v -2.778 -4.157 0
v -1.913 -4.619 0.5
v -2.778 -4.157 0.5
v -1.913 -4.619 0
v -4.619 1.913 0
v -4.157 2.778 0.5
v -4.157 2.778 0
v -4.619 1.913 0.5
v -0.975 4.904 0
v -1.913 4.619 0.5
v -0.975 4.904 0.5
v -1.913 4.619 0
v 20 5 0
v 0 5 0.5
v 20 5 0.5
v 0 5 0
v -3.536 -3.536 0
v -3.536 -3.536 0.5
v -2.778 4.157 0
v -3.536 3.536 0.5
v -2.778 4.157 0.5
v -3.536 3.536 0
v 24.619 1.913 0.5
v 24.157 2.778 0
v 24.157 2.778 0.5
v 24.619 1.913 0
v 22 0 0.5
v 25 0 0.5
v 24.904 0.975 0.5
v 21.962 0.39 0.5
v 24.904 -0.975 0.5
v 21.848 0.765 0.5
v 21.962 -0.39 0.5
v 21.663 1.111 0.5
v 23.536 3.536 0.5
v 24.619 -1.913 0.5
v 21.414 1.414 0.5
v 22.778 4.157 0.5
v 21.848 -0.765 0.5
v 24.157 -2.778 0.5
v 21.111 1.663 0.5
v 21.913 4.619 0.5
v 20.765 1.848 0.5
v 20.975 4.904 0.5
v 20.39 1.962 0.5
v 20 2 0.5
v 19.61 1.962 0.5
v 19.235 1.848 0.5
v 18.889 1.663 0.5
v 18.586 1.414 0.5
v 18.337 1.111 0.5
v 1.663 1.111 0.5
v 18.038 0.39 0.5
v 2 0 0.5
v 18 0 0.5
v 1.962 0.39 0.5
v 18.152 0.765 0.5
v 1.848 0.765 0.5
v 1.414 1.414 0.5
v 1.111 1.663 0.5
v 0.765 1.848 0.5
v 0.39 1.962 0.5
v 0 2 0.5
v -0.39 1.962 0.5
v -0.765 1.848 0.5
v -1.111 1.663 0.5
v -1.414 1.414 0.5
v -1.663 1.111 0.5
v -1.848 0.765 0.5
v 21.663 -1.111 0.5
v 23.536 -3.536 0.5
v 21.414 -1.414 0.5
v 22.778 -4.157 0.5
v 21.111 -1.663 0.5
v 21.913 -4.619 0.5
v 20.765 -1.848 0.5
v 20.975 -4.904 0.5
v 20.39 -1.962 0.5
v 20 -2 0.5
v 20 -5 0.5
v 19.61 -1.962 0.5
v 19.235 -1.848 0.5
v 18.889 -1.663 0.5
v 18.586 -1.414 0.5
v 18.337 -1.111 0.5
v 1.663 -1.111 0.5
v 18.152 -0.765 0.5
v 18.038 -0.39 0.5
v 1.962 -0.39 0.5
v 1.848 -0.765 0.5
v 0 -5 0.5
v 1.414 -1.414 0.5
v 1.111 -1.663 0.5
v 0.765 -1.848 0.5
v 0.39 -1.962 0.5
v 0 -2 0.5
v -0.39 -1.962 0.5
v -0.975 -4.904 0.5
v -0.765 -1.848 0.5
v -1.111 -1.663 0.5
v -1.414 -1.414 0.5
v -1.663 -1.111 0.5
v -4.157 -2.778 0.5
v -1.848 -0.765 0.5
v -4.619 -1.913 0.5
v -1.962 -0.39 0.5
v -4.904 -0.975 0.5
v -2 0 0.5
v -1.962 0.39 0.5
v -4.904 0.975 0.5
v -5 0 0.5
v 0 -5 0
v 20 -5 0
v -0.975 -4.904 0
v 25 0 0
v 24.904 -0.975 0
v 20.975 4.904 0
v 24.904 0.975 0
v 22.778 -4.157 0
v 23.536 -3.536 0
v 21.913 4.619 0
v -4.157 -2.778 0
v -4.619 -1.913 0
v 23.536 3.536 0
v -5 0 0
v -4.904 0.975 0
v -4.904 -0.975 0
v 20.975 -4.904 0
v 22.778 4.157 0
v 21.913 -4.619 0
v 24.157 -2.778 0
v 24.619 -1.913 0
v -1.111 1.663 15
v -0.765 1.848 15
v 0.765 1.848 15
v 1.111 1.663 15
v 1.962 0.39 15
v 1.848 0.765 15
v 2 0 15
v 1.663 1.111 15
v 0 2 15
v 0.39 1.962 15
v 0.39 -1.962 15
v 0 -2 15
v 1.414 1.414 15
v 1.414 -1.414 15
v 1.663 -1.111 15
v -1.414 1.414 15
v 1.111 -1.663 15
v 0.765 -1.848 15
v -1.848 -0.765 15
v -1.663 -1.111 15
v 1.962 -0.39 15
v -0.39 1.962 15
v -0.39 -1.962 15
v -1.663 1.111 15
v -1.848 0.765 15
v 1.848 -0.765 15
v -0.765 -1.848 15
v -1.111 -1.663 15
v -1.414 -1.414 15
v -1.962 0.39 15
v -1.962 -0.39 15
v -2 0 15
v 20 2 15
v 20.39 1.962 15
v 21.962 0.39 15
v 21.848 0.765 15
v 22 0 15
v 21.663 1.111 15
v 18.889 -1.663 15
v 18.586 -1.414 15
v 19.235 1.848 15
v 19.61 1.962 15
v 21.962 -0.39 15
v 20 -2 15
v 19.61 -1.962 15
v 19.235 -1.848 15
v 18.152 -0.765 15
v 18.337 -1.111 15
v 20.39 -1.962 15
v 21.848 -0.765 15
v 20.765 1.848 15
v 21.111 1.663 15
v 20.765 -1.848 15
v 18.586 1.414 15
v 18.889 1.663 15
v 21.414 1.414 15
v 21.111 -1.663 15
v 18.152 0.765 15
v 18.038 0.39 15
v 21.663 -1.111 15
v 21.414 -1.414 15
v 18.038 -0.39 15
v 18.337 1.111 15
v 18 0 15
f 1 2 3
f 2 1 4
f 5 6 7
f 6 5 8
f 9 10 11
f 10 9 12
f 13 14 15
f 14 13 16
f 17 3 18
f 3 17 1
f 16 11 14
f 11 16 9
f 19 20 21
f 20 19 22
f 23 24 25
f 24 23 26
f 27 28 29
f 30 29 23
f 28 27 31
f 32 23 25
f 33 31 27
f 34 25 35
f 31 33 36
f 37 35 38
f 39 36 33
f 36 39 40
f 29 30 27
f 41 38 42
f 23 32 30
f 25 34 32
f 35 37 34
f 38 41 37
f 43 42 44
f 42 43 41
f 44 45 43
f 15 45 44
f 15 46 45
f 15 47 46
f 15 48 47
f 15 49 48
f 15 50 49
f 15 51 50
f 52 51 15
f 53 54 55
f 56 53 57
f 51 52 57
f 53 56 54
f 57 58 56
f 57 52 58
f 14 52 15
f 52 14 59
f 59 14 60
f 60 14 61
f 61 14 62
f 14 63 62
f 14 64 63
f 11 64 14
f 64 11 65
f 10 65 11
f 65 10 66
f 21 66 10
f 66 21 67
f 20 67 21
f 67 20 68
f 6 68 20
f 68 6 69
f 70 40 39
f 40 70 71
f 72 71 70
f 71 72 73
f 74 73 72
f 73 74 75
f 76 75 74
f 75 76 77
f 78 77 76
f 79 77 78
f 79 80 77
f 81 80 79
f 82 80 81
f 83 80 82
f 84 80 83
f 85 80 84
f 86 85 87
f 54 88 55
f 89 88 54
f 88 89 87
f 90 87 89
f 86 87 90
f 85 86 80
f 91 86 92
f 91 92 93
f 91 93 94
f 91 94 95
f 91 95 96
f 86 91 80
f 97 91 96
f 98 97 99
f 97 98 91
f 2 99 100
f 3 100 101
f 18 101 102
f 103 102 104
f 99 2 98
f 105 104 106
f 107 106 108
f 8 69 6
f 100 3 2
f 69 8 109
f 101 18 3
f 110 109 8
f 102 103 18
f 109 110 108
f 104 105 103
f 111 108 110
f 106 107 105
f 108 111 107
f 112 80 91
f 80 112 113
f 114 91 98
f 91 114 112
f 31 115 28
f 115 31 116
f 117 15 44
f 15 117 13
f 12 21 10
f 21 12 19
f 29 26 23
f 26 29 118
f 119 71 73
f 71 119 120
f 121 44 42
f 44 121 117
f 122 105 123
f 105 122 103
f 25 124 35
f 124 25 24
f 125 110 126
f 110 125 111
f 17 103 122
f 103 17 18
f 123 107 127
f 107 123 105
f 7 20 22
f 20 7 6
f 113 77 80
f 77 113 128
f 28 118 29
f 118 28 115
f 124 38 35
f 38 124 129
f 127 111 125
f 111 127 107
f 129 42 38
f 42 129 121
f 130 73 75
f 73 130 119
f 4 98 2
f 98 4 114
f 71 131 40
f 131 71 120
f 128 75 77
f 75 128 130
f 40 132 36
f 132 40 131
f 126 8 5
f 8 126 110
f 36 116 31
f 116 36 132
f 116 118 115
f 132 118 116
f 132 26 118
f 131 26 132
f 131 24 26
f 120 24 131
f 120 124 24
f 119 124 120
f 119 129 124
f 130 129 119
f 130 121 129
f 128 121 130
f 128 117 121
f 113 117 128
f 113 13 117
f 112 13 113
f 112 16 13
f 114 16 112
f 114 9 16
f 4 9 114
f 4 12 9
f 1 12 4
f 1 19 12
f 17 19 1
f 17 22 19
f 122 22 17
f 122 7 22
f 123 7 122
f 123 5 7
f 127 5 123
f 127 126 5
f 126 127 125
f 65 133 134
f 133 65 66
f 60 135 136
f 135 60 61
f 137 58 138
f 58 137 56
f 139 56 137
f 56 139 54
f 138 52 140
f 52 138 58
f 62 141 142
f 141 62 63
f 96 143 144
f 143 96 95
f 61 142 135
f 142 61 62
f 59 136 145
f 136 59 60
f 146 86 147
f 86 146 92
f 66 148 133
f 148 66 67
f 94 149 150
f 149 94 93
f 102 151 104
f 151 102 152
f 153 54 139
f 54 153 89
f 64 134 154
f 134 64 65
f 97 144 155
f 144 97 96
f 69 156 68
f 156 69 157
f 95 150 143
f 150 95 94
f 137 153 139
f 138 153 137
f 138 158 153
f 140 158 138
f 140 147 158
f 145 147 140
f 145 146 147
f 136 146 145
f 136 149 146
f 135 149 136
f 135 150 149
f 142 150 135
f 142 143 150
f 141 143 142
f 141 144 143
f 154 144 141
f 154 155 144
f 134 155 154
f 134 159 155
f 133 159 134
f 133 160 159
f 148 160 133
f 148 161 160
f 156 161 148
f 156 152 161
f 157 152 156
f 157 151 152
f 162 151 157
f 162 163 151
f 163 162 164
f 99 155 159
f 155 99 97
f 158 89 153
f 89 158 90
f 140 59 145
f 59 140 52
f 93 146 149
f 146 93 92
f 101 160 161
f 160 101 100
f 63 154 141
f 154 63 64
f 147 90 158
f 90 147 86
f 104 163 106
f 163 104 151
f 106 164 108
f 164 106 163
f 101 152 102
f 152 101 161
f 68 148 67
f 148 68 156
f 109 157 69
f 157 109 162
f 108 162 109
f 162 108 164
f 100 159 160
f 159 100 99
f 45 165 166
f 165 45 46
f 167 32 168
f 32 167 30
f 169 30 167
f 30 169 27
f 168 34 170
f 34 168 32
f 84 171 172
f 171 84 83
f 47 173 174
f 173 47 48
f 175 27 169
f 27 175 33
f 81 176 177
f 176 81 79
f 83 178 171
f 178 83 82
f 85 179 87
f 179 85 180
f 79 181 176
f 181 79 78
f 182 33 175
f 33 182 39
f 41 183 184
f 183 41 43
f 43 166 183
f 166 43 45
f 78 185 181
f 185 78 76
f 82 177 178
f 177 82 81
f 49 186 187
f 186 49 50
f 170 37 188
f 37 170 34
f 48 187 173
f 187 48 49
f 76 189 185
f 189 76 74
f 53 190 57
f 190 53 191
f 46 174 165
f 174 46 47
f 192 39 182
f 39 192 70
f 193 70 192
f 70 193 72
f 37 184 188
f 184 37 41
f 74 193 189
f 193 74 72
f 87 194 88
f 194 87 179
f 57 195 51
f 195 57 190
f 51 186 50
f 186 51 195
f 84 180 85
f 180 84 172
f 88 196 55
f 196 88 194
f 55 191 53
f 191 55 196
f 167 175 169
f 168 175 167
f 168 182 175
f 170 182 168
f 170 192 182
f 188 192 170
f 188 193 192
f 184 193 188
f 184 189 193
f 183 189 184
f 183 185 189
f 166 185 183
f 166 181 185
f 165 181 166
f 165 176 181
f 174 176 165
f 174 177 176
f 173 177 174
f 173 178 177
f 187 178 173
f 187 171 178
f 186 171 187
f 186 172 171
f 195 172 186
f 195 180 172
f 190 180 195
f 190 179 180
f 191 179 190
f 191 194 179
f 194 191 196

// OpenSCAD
//

dist = 20; // Distance between poles

dd = 4; //diameter of poles

wall = 10; 

hh = 15;

$fn= 32;
union() {
hull() {
    cylinder(d=wall, h=0.5);
    translate([dist,0,0])cylinder(d=wall, h=0.5);
}
    cylinder(d=dd, h=hh);
    translate([dist,0,0])cylinder(d=dd, h=hh);
}
